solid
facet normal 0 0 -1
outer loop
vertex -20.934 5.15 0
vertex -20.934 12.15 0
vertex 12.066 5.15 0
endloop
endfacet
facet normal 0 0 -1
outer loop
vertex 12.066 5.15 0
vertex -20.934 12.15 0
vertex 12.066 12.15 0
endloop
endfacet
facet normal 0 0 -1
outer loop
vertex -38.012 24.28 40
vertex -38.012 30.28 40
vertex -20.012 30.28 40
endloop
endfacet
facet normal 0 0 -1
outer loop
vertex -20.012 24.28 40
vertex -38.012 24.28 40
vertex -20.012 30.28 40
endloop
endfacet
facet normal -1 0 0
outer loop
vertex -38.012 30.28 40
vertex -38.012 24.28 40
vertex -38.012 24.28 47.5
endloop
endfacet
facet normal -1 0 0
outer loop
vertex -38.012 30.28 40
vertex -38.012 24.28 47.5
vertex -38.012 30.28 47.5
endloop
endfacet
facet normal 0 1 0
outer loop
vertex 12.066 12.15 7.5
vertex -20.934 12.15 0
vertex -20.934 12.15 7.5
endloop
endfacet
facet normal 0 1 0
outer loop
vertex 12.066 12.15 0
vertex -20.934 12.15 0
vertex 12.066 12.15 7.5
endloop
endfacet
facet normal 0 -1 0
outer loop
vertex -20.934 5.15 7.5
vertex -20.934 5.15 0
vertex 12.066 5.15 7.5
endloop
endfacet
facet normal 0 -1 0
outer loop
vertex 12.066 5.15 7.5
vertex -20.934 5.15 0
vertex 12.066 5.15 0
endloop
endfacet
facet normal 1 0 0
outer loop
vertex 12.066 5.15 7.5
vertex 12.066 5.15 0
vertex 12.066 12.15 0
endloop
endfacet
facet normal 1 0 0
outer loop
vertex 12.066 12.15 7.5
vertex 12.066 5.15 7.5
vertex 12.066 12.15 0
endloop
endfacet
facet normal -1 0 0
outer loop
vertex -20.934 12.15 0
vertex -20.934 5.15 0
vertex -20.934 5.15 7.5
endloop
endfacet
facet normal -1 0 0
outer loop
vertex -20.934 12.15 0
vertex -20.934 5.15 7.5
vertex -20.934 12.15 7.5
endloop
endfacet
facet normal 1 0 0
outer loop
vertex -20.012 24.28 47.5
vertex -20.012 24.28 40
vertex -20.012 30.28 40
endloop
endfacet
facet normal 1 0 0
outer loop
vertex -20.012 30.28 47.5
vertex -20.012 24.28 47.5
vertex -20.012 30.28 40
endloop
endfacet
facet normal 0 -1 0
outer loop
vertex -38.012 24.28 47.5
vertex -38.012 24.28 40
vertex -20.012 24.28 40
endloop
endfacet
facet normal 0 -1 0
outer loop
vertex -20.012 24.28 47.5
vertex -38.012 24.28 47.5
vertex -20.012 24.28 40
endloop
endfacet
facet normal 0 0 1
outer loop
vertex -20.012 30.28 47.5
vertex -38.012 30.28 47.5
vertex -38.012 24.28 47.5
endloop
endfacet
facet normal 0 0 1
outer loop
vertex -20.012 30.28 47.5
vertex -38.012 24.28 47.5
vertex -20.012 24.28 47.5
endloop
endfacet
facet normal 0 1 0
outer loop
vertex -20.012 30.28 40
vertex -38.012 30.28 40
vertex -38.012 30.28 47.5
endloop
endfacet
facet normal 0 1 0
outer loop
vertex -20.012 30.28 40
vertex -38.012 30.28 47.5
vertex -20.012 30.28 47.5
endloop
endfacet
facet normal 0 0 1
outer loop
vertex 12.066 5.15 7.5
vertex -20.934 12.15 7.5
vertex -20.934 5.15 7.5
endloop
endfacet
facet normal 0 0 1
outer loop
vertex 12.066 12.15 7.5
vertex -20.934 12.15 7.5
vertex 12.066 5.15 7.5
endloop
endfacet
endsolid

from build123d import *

# Parameters (mm, degrees)
F0_W     = 33
F0_H     = 7
F1_DEPTH = 7.5
F3_W     = 18
F3_H     = 6
F4_DEPTH = 7.5


with BuildPart() as f1:
    # F0 (on Top) → F1 (new body)
    with BuildSketch(Plane.XY):
        with Locations((-4.433752, 8.650231)):
            Rectangle(F0_W, F0_H)
    extrude(amount=F1_DEPTH)


with BuildPart() as f4:
    # F3 (on offset) → F4 (new body)
    with BuildSketch(Plane.XY.offset(40)):
        with Locations((-29.012308, 27.279634)):
            Rectangle(F3_W, F3_H)
    extrude(amount=F4_DEPTH)


solid = Compound([f1.part, f4.part])
